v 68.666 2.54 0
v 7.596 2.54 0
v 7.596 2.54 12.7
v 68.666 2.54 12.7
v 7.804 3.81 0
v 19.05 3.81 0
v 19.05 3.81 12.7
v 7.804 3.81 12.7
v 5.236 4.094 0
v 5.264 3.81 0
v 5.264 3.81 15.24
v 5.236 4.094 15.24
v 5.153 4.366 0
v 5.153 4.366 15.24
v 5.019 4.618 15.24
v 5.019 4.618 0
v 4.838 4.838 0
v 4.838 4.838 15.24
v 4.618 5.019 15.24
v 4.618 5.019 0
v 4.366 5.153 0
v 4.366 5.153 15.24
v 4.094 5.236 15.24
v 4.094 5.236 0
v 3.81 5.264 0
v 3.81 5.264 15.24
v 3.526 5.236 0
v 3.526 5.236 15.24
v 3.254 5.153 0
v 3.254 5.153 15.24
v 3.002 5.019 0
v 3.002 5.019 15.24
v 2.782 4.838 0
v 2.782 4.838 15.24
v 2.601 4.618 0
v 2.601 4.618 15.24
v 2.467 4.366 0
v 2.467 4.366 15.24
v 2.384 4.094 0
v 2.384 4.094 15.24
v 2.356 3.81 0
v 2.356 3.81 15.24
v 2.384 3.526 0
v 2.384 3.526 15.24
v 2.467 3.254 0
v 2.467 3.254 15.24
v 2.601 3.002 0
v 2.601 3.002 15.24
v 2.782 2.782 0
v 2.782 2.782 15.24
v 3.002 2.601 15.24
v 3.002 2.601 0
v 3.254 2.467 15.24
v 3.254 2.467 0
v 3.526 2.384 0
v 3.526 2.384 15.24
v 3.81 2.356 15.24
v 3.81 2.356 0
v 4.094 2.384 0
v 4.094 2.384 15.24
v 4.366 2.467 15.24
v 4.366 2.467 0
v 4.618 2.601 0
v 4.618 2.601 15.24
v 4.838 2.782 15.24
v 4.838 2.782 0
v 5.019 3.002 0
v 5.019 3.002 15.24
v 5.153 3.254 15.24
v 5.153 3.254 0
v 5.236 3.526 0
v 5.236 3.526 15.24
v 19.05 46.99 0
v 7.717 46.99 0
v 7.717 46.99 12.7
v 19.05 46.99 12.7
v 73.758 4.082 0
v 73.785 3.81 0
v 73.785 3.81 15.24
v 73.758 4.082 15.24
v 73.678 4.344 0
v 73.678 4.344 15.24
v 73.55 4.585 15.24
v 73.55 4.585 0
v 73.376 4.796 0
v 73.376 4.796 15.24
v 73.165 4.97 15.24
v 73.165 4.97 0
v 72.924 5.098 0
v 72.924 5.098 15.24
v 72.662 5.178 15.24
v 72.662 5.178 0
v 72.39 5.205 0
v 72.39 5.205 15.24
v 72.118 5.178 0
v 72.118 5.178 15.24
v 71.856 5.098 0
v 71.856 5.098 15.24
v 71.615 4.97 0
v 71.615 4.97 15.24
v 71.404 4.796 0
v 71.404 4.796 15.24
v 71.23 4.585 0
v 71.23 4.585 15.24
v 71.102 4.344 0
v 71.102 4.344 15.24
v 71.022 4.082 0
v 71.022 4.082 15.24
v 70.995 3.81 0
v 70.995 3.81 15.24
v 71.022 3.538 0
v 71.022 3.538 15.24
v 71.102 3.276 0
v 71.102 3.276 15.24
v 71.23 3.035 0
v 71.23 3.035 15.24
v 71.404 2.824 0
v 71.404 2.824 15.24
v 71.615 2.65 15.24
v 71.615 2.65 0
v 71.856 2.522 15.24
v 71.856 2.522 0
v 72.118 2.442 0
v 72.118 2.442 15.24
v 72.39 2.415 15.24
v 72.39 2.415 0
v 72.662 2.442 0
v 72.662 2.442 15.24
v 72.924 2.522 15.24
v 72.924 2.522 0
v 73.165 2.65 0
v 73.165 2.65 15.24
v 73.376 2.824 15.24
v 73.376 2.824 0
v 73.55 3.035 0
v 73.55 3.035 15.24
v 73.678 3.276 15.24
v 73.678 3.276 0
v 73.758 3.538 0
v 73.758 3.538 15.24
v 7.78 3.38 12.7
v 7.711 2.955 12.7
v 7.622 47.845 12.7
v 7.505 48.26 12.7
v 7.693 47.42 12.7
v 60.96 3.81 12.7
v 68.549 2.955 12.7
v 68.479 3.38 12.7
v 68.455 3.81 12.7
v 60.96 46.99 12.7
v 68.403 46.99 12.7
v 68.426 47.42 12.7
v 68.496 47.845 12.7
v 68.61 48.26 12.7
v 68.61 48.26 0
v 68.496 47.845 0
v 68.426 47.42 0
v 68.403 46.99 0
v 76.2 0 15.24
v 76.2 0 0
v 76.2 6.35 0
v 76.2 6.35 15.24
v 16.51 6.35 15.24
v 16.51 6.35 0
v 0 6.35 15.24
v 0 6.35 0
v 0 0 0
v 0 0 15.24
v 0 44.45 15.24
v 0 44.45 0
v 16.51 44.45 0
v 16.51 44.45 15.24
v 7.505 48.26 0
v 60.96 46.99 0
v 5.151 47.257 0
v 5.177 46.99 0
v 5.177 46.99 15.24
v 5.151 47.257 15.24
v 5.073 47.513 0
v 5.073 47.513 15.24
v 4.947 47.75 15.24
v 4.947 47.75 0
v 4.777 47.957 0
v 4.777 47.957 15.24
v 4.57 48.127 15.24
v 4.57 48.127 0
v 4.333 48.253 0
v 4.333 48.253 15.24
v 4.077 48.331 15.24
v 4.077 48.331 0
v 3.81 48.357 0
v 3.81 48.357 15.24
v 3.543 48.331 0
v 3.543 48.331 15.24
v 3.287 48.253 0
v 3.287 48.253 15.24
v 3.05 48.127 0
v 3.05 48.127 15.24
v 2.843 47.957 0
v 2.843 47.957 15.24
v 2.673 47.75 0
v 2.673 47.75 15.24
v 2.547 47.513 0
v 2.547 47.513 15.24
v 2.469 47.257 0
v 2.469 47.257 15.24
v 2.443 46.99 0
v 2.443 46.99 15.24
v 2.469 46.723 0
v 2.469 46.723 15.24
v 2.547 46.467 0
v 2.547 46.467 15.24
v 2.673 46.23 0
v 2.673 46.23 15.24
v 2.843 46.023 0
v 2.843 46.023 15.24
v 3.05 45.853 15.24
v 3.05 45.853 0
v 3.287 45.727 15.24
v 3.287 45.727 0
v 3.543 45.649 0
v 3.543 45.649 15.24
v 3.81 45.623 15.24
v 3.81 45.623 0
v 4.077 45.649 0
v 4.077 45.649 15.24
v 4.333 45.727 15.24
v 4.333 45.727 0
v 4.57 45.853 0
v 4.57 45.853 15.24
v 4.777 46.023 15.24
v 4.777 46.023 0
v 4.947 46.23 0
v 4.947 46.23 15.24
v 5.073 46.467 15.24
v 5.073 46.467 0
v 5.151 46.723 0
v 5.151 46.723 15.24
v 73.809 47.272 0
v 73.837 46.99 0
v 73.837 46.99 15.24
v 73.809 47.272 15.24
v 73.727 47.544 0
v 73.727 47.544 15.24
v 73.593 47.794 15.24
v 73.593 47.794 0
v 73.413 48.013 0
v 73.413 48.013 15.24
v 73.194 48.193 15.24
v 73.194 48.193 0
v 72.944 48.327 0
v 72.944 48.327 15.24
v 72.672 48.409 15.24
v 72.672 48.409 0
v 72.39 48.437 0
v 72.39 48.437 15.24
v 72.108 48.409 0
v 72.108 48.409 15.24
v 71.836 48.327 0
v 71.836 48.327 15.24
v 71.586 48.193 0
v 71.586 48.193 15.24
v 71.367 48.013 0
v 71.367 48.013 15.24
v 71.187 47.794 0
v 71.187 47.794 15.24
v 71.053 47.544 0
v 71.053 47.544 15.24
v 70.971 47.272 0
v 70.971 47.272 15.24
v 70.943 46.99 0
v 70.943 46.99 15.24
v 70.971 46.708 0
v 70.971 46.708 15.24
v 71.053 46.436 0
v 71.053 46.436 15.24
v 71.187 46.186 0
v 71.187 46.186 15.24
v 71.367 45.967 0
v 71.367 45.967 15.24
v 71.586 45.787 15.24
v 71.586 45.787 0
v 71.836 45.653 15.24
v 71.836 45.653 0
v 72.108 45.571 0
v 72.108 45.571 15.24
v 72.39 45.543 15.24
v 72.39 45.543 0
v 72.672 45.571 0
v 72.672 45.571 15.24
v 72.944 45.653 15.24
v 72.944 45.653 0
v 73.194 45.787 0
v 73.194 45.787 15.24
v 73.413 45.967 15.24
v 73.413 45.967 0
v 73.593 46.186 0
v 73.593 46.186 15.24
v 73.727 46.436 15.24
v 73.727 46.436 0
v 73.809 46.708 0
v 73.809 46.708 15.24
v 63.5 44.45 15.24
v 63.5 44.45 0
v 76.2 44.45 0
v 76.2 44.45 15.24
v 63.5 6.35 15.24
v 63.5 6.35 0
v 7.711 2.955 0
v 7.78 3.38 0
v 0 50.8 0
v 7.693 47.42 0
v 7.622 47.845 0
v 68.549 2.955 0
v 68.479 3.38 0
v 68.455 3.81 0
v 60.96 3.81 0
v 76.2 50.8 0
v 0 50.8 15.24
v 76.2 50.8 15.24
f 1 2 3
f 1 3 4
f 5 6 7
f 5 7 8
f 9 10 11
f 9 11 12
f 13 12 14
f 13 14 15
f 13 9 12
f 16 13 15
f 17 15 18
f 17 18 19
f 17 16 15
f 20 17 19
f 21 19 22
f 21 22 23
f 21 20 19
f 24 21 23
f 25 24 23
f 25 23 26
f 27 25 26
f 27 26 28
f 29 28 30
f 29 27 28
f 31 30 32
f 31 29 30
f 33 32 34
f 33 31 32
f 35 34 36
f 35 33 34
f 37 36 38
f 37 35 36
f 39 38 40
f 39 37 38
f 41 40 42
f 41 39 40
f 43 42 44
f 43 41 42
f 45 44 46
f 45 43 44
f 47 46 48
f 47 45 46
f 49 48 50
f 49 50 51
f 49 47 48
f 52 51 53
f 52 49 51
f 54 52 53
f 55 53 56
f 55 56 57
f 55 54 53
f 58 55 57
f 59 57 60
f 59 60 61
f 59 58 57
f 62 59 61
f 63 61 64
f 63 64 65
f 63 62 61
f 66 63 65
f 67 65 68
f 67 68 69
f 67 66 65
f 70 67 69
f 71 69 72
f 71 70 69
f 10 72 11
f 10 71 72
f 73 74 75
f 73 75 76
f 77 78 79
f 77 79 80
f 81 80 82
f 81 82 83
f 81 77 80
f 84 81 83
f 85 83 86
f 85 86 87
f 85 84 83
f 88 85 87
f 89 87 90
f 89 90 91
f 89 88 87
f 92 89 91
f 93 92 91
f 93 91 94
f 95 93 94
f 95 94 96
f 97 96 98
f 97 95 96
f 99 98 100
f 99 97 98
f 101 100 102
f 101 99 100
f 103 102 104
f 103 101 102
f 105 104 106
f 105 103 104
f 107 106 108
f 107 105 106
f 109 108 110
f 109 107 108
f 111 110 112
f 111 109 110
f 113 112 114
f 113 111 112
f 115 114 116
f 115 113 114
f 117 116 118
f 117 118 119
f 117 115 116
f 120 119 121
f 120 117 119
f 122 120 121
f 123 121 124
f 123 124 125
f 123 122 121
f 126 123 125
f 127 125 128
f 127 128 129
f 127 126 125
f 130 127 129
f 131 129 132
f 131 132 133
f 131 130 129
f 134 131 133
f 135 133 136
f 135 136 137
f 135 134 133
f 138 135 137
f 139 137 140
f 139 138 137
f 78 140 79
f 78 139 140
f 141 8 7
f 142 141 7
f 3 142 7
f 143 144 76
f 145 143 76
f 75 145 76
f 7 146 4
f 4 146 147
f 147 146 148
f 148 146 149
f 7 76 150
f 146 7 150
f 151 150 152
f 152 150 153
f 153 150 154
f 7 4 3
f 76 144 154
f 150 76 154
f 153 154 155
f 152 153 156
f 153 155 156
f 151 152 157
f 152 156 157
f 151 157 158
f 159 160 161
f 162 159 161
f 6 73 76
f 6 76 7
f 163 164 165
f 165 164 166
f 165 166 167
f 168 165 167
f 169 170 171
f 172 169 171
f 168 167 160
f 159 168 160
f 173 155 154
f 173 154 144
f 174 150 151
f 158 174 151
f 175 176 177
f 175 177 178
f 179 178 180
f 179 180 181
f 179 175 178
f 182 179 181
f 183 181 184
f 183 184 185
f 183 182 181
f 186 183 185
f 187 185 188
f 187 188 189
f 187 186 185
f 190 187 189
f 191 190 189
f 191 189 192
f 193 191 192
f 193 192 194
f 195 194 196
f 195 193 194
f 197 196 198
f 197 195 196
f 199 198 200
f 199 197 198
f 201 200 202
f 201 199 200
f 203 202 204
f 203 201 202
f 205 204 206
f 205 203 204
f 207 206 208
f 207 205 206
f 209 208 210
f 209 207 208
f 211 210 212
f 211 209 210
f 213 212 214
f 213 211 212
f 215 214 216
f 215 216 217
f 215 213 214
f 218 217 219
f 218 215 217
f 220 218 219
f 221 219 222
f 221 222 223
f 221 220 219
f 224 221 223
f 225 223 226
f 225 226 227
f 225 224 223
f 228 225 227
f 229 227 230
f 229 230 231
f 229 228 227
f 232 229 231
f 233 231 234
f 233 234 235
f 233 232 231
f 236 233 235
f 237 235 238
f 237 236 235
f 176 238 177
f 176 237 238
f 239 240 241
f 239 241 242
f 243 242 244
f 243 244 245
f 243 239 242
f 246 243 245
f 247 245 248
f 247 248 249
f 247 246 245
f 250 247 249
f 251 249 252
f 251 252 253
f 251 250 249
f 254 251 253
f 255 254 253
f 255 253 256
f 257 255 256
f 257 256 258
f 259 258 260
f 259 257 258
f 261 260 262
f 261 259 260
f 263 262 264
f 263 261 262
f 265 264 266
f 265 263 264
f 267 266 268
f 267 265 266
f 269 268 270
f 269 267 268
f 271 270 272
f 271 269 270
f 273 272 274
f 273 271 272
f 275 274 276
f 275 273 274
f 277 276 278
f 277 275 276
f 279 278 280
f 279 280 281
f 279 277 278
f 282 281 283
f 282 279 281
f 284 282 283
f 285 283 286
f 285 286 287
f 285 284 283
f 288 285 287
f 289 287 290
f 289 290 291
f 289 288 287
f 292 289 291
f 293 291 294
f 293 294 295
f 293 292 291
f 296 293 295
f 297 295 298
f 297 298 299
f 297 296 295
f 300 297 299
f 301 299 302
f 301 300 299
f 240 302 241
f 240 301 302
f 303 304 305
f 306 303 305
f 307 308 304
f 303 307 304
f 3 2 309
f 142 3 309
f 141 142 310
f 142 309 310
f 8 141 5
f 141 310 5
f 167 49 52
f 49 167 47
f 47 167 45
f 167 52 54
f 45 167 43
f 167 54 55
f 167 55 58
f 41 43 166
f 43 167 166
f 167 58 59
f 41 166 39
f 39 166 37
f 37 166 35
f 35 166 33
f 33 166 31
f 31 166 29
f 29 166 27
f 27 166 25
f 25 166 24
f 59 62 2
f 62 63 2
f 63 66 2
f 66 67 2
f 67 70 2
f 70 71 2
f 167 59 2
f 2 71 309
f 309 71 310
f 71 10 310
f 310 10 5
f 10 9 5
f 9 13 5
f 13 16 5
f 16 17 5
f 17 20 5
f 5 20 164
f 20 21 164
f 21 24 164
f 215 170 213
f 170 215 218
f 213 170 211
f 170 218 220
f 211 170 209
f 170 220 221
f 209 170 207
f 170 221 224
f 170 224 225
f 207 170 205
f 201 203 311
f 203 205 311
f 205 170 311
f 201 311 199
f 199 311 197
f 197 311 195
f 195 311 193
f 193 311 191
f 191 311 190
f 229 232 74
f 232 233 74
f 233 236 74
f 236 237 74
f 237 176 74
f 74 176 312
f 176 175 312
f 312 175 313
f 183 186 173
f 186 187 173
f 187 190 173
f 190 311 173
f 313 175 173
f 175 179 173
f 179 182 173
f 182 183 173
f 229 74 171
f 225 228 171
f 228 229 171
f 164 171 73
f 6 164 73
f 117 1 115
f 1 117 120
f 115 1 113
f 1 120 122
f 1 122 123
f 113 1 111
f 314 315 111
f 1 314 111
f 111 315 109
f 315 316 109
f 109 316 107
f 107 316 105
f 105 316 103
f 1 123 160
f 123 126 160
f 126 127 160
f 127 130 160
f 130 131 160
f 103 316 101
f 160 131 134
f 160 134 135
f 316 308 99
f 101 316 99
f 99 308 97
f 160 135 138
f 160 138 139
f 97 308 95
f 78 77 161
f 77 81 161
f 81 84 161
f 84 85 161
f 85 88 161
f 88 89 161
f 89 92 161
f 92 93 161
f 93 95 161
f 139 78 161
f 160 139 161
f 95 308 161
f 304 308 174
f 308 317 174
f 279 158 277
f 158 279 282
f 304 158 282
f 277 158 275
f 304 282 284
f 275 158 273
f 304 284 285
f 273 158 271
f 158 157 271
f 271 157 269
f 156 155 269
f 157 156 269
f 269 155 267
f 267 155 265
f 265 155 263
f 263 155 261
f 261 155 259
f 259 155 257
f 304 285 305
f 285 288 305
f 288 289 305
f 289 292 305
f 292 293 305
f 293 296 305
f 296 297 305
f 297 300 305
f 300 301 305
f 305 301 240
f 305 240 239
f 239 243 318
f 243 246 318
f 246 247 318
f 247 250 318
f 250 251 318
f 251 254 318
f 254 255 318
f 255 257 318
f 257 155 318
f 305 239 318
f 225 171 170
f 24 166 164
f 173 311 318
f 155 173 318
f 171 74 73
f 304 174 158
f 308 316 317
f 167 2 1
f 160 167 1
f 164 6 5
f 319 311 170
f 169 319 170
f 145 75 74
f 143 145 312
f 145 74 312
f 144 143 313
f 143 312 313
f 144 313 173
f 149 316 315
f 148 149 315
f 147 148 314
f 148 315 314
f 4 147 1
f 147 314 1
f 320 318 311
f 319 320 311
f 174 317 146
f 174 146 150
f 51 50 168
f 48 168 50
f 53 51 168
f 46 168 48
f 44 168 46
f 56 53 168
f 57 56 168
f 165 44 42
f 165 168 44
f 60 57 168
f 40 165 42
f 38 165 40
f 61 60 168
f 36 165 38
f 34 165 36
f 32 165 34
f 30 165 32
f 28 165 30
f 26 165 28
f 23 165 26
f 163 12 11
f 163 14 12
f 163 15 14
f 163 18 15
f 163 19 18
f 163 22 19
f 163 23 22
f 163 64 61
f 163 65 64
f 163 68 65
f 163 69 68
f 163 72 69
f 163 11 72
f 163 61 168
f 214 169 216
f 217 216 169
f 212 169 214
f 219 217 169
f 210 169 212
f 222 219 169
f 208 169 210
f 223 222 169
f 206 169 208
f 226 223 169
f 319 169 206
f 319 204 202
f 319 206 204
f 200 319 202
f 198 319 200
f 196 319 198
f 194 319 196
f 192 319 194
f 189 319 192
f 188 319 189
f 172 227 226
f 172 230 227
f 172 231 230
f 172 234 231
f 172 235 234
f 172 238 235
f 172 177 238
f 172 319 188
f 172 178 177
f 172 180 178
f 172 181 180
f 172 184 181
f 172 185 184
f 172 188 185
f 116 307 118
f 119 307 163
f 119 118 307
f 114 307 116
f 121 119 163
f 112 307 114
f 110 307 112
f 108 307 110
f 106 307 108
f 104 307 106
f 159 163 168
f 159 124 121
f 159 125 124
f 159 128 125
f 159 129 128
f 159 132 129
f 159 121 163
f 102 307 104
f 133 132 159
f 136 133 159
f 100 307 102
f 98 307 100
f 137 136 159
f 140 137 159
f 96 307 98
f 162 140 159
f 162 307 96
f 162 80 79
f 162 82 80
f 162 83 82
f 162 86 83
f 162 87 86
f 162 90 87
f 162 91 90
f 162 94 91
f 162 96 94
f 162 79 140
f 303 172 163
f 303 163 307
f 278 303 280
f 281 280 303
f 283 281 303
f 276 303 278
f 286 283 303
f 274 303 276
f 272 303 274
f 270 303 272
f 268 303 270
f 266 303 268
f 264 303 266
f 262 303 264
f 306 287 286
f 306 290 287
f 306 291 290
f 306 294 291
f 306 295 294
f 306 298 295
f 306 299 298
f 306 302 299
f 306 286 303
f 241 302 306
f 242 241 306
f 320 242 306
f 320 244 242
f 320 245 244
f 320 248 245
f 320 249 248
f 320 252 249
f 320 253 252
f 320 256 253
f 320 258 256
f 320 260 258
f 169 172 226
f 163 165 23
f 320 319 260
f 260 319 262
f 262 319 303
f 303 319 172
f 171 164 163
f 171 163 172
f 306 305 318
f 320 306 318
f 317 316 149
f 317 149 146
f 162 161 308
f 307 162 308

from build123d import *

# Parameters (mm, degrees)
F0_R        = 1.3671138527
F0_R_2      = 1.4471777078
F0_W        = 46.99
F0_H        = 38.1
F0_R_3      = 1.4536013708
F0_R_4      = 1.3946138209
F1_DEPTH    = 15.24
F2_T        = 2.54
F2_T3_DEPTH = 20.32


# Not quite as in the source:
# - a shell that OpenCascade refuses in one call is made with other operations: the cavity is built on its own and cut out


with BuildPart() as f1:
    # F0 (on Top) → F1 (new body)
    with BuildSketch(Plane.XY):
        Polygon((0, 46.99), (0, 44.45), (16.51, 44.45), (63.5, 44.45), (76.2, 44.45), (76.2, 46.99), (76.2, 50.8), (72.39, 50.8), (3.81, 50.8), (0, 50.8), align=None)
        with Locations((3.81, 46.99)):
            Circle(F0_R, mode=Mode.SUBTRACT)
        with Locations((72.39, 46.99)):
            Circle(F0_R_2, mode=Mode.SUBTRACT)
        with Locations((40.005, 25.4)):
            Rectangle(F0_W, F0_H)
        Polygon((0, 3.175), (0, 0), (3.81, 0), (72.39, 0), (76.2, 0), (76.2, 3.81), (76.2, 6.35), (63.5, 6.35), (16.51, 6.35), (0, 6.35), (0, 3.81), align=None)
        with Locations((3.81, 3.81)):
            Circle(F0_R_3, mode=Mode.SUBTRACT)
        with Locations((72.39, 3.81)):
            Circle(F0_R_4, mode=Mode.SUBTRACT)
    extrude(amount=F1_DEPTH)

    # F2: shell of thickness 2.54, made by hand


with BuildPart() as f2_core1:
    # F2_t2: copy of F1
    add(f1.part)

    # the walls: a layer under each face that stays
    f2_faces = [f2_core1.faces().sort_by_distance(p)[0] for p in [
        (8.255, 44.45, 7.62),
        (16.51, 25.4, 7.62),
        (8.255, 6.35, 7.62),
        (0, 3.175, 7.62),
        (38.1, 0, 7.62),
        (76.2, 3.175, 7.62),
        (69.85, 6.35, 7.62),
        (63.5, 25.4, 7.62),
        (69.85, 44.45, 7.62),
        (76.2, 47.625, 7.62),
        (38.1, 50.8, 7.62),
        (0, 47.625, 7.62),
        (2.4428861473, 46.99, 7.62),
        (70.9428222922, 46.99, 7.62),
        (70.9953861791, 3.81, 7.62),
        (2.3563986292, 3.81, 7.62),
        (38.1, 25.4, 15.24),
    ]]
    thicken(f2_faces, amount=-F2_T, mode=Mode.SUBTRACT)

    # F2_s4 → F2_t3 (cut)
    with BuildSketch(Plane.XY.offset(-2.54)):
        Polygon((16.4846, 44.4246), (16.51, 46.99), (19.05, 46.99), (19.05, 44.45), align=None)
        Polygon((16.4846, 6.3754), (19.05, 6.35), (19.05, 3.81), (16.51, 3.81), align=None)
        Polygon((63.5254, 6.3754), (63.5, 3.81), (60.96, 3.81), (60.96, 6.35), align=None)
        Polygon((63.5254, 44.4246), (60.96, 44.45), (60.96, 46.99), (63.5, 46.99), align=None)
    extrude(amount=F2_T3_DEPTH, mode=Mode.SUBTRACT)


with BuildPart() as f1_1:
    add(f1.part)

    # what is left inside the walls is the cavity
    f2_cavity = [f2_core1.part.solids().sort_by_distance(p)[0] for p in [
        (38.085466, 17.78, 0.0254),
    ]]
    add(f2_cavity, mode=Mode.SUBTRACT)


solid = f1_1.part
